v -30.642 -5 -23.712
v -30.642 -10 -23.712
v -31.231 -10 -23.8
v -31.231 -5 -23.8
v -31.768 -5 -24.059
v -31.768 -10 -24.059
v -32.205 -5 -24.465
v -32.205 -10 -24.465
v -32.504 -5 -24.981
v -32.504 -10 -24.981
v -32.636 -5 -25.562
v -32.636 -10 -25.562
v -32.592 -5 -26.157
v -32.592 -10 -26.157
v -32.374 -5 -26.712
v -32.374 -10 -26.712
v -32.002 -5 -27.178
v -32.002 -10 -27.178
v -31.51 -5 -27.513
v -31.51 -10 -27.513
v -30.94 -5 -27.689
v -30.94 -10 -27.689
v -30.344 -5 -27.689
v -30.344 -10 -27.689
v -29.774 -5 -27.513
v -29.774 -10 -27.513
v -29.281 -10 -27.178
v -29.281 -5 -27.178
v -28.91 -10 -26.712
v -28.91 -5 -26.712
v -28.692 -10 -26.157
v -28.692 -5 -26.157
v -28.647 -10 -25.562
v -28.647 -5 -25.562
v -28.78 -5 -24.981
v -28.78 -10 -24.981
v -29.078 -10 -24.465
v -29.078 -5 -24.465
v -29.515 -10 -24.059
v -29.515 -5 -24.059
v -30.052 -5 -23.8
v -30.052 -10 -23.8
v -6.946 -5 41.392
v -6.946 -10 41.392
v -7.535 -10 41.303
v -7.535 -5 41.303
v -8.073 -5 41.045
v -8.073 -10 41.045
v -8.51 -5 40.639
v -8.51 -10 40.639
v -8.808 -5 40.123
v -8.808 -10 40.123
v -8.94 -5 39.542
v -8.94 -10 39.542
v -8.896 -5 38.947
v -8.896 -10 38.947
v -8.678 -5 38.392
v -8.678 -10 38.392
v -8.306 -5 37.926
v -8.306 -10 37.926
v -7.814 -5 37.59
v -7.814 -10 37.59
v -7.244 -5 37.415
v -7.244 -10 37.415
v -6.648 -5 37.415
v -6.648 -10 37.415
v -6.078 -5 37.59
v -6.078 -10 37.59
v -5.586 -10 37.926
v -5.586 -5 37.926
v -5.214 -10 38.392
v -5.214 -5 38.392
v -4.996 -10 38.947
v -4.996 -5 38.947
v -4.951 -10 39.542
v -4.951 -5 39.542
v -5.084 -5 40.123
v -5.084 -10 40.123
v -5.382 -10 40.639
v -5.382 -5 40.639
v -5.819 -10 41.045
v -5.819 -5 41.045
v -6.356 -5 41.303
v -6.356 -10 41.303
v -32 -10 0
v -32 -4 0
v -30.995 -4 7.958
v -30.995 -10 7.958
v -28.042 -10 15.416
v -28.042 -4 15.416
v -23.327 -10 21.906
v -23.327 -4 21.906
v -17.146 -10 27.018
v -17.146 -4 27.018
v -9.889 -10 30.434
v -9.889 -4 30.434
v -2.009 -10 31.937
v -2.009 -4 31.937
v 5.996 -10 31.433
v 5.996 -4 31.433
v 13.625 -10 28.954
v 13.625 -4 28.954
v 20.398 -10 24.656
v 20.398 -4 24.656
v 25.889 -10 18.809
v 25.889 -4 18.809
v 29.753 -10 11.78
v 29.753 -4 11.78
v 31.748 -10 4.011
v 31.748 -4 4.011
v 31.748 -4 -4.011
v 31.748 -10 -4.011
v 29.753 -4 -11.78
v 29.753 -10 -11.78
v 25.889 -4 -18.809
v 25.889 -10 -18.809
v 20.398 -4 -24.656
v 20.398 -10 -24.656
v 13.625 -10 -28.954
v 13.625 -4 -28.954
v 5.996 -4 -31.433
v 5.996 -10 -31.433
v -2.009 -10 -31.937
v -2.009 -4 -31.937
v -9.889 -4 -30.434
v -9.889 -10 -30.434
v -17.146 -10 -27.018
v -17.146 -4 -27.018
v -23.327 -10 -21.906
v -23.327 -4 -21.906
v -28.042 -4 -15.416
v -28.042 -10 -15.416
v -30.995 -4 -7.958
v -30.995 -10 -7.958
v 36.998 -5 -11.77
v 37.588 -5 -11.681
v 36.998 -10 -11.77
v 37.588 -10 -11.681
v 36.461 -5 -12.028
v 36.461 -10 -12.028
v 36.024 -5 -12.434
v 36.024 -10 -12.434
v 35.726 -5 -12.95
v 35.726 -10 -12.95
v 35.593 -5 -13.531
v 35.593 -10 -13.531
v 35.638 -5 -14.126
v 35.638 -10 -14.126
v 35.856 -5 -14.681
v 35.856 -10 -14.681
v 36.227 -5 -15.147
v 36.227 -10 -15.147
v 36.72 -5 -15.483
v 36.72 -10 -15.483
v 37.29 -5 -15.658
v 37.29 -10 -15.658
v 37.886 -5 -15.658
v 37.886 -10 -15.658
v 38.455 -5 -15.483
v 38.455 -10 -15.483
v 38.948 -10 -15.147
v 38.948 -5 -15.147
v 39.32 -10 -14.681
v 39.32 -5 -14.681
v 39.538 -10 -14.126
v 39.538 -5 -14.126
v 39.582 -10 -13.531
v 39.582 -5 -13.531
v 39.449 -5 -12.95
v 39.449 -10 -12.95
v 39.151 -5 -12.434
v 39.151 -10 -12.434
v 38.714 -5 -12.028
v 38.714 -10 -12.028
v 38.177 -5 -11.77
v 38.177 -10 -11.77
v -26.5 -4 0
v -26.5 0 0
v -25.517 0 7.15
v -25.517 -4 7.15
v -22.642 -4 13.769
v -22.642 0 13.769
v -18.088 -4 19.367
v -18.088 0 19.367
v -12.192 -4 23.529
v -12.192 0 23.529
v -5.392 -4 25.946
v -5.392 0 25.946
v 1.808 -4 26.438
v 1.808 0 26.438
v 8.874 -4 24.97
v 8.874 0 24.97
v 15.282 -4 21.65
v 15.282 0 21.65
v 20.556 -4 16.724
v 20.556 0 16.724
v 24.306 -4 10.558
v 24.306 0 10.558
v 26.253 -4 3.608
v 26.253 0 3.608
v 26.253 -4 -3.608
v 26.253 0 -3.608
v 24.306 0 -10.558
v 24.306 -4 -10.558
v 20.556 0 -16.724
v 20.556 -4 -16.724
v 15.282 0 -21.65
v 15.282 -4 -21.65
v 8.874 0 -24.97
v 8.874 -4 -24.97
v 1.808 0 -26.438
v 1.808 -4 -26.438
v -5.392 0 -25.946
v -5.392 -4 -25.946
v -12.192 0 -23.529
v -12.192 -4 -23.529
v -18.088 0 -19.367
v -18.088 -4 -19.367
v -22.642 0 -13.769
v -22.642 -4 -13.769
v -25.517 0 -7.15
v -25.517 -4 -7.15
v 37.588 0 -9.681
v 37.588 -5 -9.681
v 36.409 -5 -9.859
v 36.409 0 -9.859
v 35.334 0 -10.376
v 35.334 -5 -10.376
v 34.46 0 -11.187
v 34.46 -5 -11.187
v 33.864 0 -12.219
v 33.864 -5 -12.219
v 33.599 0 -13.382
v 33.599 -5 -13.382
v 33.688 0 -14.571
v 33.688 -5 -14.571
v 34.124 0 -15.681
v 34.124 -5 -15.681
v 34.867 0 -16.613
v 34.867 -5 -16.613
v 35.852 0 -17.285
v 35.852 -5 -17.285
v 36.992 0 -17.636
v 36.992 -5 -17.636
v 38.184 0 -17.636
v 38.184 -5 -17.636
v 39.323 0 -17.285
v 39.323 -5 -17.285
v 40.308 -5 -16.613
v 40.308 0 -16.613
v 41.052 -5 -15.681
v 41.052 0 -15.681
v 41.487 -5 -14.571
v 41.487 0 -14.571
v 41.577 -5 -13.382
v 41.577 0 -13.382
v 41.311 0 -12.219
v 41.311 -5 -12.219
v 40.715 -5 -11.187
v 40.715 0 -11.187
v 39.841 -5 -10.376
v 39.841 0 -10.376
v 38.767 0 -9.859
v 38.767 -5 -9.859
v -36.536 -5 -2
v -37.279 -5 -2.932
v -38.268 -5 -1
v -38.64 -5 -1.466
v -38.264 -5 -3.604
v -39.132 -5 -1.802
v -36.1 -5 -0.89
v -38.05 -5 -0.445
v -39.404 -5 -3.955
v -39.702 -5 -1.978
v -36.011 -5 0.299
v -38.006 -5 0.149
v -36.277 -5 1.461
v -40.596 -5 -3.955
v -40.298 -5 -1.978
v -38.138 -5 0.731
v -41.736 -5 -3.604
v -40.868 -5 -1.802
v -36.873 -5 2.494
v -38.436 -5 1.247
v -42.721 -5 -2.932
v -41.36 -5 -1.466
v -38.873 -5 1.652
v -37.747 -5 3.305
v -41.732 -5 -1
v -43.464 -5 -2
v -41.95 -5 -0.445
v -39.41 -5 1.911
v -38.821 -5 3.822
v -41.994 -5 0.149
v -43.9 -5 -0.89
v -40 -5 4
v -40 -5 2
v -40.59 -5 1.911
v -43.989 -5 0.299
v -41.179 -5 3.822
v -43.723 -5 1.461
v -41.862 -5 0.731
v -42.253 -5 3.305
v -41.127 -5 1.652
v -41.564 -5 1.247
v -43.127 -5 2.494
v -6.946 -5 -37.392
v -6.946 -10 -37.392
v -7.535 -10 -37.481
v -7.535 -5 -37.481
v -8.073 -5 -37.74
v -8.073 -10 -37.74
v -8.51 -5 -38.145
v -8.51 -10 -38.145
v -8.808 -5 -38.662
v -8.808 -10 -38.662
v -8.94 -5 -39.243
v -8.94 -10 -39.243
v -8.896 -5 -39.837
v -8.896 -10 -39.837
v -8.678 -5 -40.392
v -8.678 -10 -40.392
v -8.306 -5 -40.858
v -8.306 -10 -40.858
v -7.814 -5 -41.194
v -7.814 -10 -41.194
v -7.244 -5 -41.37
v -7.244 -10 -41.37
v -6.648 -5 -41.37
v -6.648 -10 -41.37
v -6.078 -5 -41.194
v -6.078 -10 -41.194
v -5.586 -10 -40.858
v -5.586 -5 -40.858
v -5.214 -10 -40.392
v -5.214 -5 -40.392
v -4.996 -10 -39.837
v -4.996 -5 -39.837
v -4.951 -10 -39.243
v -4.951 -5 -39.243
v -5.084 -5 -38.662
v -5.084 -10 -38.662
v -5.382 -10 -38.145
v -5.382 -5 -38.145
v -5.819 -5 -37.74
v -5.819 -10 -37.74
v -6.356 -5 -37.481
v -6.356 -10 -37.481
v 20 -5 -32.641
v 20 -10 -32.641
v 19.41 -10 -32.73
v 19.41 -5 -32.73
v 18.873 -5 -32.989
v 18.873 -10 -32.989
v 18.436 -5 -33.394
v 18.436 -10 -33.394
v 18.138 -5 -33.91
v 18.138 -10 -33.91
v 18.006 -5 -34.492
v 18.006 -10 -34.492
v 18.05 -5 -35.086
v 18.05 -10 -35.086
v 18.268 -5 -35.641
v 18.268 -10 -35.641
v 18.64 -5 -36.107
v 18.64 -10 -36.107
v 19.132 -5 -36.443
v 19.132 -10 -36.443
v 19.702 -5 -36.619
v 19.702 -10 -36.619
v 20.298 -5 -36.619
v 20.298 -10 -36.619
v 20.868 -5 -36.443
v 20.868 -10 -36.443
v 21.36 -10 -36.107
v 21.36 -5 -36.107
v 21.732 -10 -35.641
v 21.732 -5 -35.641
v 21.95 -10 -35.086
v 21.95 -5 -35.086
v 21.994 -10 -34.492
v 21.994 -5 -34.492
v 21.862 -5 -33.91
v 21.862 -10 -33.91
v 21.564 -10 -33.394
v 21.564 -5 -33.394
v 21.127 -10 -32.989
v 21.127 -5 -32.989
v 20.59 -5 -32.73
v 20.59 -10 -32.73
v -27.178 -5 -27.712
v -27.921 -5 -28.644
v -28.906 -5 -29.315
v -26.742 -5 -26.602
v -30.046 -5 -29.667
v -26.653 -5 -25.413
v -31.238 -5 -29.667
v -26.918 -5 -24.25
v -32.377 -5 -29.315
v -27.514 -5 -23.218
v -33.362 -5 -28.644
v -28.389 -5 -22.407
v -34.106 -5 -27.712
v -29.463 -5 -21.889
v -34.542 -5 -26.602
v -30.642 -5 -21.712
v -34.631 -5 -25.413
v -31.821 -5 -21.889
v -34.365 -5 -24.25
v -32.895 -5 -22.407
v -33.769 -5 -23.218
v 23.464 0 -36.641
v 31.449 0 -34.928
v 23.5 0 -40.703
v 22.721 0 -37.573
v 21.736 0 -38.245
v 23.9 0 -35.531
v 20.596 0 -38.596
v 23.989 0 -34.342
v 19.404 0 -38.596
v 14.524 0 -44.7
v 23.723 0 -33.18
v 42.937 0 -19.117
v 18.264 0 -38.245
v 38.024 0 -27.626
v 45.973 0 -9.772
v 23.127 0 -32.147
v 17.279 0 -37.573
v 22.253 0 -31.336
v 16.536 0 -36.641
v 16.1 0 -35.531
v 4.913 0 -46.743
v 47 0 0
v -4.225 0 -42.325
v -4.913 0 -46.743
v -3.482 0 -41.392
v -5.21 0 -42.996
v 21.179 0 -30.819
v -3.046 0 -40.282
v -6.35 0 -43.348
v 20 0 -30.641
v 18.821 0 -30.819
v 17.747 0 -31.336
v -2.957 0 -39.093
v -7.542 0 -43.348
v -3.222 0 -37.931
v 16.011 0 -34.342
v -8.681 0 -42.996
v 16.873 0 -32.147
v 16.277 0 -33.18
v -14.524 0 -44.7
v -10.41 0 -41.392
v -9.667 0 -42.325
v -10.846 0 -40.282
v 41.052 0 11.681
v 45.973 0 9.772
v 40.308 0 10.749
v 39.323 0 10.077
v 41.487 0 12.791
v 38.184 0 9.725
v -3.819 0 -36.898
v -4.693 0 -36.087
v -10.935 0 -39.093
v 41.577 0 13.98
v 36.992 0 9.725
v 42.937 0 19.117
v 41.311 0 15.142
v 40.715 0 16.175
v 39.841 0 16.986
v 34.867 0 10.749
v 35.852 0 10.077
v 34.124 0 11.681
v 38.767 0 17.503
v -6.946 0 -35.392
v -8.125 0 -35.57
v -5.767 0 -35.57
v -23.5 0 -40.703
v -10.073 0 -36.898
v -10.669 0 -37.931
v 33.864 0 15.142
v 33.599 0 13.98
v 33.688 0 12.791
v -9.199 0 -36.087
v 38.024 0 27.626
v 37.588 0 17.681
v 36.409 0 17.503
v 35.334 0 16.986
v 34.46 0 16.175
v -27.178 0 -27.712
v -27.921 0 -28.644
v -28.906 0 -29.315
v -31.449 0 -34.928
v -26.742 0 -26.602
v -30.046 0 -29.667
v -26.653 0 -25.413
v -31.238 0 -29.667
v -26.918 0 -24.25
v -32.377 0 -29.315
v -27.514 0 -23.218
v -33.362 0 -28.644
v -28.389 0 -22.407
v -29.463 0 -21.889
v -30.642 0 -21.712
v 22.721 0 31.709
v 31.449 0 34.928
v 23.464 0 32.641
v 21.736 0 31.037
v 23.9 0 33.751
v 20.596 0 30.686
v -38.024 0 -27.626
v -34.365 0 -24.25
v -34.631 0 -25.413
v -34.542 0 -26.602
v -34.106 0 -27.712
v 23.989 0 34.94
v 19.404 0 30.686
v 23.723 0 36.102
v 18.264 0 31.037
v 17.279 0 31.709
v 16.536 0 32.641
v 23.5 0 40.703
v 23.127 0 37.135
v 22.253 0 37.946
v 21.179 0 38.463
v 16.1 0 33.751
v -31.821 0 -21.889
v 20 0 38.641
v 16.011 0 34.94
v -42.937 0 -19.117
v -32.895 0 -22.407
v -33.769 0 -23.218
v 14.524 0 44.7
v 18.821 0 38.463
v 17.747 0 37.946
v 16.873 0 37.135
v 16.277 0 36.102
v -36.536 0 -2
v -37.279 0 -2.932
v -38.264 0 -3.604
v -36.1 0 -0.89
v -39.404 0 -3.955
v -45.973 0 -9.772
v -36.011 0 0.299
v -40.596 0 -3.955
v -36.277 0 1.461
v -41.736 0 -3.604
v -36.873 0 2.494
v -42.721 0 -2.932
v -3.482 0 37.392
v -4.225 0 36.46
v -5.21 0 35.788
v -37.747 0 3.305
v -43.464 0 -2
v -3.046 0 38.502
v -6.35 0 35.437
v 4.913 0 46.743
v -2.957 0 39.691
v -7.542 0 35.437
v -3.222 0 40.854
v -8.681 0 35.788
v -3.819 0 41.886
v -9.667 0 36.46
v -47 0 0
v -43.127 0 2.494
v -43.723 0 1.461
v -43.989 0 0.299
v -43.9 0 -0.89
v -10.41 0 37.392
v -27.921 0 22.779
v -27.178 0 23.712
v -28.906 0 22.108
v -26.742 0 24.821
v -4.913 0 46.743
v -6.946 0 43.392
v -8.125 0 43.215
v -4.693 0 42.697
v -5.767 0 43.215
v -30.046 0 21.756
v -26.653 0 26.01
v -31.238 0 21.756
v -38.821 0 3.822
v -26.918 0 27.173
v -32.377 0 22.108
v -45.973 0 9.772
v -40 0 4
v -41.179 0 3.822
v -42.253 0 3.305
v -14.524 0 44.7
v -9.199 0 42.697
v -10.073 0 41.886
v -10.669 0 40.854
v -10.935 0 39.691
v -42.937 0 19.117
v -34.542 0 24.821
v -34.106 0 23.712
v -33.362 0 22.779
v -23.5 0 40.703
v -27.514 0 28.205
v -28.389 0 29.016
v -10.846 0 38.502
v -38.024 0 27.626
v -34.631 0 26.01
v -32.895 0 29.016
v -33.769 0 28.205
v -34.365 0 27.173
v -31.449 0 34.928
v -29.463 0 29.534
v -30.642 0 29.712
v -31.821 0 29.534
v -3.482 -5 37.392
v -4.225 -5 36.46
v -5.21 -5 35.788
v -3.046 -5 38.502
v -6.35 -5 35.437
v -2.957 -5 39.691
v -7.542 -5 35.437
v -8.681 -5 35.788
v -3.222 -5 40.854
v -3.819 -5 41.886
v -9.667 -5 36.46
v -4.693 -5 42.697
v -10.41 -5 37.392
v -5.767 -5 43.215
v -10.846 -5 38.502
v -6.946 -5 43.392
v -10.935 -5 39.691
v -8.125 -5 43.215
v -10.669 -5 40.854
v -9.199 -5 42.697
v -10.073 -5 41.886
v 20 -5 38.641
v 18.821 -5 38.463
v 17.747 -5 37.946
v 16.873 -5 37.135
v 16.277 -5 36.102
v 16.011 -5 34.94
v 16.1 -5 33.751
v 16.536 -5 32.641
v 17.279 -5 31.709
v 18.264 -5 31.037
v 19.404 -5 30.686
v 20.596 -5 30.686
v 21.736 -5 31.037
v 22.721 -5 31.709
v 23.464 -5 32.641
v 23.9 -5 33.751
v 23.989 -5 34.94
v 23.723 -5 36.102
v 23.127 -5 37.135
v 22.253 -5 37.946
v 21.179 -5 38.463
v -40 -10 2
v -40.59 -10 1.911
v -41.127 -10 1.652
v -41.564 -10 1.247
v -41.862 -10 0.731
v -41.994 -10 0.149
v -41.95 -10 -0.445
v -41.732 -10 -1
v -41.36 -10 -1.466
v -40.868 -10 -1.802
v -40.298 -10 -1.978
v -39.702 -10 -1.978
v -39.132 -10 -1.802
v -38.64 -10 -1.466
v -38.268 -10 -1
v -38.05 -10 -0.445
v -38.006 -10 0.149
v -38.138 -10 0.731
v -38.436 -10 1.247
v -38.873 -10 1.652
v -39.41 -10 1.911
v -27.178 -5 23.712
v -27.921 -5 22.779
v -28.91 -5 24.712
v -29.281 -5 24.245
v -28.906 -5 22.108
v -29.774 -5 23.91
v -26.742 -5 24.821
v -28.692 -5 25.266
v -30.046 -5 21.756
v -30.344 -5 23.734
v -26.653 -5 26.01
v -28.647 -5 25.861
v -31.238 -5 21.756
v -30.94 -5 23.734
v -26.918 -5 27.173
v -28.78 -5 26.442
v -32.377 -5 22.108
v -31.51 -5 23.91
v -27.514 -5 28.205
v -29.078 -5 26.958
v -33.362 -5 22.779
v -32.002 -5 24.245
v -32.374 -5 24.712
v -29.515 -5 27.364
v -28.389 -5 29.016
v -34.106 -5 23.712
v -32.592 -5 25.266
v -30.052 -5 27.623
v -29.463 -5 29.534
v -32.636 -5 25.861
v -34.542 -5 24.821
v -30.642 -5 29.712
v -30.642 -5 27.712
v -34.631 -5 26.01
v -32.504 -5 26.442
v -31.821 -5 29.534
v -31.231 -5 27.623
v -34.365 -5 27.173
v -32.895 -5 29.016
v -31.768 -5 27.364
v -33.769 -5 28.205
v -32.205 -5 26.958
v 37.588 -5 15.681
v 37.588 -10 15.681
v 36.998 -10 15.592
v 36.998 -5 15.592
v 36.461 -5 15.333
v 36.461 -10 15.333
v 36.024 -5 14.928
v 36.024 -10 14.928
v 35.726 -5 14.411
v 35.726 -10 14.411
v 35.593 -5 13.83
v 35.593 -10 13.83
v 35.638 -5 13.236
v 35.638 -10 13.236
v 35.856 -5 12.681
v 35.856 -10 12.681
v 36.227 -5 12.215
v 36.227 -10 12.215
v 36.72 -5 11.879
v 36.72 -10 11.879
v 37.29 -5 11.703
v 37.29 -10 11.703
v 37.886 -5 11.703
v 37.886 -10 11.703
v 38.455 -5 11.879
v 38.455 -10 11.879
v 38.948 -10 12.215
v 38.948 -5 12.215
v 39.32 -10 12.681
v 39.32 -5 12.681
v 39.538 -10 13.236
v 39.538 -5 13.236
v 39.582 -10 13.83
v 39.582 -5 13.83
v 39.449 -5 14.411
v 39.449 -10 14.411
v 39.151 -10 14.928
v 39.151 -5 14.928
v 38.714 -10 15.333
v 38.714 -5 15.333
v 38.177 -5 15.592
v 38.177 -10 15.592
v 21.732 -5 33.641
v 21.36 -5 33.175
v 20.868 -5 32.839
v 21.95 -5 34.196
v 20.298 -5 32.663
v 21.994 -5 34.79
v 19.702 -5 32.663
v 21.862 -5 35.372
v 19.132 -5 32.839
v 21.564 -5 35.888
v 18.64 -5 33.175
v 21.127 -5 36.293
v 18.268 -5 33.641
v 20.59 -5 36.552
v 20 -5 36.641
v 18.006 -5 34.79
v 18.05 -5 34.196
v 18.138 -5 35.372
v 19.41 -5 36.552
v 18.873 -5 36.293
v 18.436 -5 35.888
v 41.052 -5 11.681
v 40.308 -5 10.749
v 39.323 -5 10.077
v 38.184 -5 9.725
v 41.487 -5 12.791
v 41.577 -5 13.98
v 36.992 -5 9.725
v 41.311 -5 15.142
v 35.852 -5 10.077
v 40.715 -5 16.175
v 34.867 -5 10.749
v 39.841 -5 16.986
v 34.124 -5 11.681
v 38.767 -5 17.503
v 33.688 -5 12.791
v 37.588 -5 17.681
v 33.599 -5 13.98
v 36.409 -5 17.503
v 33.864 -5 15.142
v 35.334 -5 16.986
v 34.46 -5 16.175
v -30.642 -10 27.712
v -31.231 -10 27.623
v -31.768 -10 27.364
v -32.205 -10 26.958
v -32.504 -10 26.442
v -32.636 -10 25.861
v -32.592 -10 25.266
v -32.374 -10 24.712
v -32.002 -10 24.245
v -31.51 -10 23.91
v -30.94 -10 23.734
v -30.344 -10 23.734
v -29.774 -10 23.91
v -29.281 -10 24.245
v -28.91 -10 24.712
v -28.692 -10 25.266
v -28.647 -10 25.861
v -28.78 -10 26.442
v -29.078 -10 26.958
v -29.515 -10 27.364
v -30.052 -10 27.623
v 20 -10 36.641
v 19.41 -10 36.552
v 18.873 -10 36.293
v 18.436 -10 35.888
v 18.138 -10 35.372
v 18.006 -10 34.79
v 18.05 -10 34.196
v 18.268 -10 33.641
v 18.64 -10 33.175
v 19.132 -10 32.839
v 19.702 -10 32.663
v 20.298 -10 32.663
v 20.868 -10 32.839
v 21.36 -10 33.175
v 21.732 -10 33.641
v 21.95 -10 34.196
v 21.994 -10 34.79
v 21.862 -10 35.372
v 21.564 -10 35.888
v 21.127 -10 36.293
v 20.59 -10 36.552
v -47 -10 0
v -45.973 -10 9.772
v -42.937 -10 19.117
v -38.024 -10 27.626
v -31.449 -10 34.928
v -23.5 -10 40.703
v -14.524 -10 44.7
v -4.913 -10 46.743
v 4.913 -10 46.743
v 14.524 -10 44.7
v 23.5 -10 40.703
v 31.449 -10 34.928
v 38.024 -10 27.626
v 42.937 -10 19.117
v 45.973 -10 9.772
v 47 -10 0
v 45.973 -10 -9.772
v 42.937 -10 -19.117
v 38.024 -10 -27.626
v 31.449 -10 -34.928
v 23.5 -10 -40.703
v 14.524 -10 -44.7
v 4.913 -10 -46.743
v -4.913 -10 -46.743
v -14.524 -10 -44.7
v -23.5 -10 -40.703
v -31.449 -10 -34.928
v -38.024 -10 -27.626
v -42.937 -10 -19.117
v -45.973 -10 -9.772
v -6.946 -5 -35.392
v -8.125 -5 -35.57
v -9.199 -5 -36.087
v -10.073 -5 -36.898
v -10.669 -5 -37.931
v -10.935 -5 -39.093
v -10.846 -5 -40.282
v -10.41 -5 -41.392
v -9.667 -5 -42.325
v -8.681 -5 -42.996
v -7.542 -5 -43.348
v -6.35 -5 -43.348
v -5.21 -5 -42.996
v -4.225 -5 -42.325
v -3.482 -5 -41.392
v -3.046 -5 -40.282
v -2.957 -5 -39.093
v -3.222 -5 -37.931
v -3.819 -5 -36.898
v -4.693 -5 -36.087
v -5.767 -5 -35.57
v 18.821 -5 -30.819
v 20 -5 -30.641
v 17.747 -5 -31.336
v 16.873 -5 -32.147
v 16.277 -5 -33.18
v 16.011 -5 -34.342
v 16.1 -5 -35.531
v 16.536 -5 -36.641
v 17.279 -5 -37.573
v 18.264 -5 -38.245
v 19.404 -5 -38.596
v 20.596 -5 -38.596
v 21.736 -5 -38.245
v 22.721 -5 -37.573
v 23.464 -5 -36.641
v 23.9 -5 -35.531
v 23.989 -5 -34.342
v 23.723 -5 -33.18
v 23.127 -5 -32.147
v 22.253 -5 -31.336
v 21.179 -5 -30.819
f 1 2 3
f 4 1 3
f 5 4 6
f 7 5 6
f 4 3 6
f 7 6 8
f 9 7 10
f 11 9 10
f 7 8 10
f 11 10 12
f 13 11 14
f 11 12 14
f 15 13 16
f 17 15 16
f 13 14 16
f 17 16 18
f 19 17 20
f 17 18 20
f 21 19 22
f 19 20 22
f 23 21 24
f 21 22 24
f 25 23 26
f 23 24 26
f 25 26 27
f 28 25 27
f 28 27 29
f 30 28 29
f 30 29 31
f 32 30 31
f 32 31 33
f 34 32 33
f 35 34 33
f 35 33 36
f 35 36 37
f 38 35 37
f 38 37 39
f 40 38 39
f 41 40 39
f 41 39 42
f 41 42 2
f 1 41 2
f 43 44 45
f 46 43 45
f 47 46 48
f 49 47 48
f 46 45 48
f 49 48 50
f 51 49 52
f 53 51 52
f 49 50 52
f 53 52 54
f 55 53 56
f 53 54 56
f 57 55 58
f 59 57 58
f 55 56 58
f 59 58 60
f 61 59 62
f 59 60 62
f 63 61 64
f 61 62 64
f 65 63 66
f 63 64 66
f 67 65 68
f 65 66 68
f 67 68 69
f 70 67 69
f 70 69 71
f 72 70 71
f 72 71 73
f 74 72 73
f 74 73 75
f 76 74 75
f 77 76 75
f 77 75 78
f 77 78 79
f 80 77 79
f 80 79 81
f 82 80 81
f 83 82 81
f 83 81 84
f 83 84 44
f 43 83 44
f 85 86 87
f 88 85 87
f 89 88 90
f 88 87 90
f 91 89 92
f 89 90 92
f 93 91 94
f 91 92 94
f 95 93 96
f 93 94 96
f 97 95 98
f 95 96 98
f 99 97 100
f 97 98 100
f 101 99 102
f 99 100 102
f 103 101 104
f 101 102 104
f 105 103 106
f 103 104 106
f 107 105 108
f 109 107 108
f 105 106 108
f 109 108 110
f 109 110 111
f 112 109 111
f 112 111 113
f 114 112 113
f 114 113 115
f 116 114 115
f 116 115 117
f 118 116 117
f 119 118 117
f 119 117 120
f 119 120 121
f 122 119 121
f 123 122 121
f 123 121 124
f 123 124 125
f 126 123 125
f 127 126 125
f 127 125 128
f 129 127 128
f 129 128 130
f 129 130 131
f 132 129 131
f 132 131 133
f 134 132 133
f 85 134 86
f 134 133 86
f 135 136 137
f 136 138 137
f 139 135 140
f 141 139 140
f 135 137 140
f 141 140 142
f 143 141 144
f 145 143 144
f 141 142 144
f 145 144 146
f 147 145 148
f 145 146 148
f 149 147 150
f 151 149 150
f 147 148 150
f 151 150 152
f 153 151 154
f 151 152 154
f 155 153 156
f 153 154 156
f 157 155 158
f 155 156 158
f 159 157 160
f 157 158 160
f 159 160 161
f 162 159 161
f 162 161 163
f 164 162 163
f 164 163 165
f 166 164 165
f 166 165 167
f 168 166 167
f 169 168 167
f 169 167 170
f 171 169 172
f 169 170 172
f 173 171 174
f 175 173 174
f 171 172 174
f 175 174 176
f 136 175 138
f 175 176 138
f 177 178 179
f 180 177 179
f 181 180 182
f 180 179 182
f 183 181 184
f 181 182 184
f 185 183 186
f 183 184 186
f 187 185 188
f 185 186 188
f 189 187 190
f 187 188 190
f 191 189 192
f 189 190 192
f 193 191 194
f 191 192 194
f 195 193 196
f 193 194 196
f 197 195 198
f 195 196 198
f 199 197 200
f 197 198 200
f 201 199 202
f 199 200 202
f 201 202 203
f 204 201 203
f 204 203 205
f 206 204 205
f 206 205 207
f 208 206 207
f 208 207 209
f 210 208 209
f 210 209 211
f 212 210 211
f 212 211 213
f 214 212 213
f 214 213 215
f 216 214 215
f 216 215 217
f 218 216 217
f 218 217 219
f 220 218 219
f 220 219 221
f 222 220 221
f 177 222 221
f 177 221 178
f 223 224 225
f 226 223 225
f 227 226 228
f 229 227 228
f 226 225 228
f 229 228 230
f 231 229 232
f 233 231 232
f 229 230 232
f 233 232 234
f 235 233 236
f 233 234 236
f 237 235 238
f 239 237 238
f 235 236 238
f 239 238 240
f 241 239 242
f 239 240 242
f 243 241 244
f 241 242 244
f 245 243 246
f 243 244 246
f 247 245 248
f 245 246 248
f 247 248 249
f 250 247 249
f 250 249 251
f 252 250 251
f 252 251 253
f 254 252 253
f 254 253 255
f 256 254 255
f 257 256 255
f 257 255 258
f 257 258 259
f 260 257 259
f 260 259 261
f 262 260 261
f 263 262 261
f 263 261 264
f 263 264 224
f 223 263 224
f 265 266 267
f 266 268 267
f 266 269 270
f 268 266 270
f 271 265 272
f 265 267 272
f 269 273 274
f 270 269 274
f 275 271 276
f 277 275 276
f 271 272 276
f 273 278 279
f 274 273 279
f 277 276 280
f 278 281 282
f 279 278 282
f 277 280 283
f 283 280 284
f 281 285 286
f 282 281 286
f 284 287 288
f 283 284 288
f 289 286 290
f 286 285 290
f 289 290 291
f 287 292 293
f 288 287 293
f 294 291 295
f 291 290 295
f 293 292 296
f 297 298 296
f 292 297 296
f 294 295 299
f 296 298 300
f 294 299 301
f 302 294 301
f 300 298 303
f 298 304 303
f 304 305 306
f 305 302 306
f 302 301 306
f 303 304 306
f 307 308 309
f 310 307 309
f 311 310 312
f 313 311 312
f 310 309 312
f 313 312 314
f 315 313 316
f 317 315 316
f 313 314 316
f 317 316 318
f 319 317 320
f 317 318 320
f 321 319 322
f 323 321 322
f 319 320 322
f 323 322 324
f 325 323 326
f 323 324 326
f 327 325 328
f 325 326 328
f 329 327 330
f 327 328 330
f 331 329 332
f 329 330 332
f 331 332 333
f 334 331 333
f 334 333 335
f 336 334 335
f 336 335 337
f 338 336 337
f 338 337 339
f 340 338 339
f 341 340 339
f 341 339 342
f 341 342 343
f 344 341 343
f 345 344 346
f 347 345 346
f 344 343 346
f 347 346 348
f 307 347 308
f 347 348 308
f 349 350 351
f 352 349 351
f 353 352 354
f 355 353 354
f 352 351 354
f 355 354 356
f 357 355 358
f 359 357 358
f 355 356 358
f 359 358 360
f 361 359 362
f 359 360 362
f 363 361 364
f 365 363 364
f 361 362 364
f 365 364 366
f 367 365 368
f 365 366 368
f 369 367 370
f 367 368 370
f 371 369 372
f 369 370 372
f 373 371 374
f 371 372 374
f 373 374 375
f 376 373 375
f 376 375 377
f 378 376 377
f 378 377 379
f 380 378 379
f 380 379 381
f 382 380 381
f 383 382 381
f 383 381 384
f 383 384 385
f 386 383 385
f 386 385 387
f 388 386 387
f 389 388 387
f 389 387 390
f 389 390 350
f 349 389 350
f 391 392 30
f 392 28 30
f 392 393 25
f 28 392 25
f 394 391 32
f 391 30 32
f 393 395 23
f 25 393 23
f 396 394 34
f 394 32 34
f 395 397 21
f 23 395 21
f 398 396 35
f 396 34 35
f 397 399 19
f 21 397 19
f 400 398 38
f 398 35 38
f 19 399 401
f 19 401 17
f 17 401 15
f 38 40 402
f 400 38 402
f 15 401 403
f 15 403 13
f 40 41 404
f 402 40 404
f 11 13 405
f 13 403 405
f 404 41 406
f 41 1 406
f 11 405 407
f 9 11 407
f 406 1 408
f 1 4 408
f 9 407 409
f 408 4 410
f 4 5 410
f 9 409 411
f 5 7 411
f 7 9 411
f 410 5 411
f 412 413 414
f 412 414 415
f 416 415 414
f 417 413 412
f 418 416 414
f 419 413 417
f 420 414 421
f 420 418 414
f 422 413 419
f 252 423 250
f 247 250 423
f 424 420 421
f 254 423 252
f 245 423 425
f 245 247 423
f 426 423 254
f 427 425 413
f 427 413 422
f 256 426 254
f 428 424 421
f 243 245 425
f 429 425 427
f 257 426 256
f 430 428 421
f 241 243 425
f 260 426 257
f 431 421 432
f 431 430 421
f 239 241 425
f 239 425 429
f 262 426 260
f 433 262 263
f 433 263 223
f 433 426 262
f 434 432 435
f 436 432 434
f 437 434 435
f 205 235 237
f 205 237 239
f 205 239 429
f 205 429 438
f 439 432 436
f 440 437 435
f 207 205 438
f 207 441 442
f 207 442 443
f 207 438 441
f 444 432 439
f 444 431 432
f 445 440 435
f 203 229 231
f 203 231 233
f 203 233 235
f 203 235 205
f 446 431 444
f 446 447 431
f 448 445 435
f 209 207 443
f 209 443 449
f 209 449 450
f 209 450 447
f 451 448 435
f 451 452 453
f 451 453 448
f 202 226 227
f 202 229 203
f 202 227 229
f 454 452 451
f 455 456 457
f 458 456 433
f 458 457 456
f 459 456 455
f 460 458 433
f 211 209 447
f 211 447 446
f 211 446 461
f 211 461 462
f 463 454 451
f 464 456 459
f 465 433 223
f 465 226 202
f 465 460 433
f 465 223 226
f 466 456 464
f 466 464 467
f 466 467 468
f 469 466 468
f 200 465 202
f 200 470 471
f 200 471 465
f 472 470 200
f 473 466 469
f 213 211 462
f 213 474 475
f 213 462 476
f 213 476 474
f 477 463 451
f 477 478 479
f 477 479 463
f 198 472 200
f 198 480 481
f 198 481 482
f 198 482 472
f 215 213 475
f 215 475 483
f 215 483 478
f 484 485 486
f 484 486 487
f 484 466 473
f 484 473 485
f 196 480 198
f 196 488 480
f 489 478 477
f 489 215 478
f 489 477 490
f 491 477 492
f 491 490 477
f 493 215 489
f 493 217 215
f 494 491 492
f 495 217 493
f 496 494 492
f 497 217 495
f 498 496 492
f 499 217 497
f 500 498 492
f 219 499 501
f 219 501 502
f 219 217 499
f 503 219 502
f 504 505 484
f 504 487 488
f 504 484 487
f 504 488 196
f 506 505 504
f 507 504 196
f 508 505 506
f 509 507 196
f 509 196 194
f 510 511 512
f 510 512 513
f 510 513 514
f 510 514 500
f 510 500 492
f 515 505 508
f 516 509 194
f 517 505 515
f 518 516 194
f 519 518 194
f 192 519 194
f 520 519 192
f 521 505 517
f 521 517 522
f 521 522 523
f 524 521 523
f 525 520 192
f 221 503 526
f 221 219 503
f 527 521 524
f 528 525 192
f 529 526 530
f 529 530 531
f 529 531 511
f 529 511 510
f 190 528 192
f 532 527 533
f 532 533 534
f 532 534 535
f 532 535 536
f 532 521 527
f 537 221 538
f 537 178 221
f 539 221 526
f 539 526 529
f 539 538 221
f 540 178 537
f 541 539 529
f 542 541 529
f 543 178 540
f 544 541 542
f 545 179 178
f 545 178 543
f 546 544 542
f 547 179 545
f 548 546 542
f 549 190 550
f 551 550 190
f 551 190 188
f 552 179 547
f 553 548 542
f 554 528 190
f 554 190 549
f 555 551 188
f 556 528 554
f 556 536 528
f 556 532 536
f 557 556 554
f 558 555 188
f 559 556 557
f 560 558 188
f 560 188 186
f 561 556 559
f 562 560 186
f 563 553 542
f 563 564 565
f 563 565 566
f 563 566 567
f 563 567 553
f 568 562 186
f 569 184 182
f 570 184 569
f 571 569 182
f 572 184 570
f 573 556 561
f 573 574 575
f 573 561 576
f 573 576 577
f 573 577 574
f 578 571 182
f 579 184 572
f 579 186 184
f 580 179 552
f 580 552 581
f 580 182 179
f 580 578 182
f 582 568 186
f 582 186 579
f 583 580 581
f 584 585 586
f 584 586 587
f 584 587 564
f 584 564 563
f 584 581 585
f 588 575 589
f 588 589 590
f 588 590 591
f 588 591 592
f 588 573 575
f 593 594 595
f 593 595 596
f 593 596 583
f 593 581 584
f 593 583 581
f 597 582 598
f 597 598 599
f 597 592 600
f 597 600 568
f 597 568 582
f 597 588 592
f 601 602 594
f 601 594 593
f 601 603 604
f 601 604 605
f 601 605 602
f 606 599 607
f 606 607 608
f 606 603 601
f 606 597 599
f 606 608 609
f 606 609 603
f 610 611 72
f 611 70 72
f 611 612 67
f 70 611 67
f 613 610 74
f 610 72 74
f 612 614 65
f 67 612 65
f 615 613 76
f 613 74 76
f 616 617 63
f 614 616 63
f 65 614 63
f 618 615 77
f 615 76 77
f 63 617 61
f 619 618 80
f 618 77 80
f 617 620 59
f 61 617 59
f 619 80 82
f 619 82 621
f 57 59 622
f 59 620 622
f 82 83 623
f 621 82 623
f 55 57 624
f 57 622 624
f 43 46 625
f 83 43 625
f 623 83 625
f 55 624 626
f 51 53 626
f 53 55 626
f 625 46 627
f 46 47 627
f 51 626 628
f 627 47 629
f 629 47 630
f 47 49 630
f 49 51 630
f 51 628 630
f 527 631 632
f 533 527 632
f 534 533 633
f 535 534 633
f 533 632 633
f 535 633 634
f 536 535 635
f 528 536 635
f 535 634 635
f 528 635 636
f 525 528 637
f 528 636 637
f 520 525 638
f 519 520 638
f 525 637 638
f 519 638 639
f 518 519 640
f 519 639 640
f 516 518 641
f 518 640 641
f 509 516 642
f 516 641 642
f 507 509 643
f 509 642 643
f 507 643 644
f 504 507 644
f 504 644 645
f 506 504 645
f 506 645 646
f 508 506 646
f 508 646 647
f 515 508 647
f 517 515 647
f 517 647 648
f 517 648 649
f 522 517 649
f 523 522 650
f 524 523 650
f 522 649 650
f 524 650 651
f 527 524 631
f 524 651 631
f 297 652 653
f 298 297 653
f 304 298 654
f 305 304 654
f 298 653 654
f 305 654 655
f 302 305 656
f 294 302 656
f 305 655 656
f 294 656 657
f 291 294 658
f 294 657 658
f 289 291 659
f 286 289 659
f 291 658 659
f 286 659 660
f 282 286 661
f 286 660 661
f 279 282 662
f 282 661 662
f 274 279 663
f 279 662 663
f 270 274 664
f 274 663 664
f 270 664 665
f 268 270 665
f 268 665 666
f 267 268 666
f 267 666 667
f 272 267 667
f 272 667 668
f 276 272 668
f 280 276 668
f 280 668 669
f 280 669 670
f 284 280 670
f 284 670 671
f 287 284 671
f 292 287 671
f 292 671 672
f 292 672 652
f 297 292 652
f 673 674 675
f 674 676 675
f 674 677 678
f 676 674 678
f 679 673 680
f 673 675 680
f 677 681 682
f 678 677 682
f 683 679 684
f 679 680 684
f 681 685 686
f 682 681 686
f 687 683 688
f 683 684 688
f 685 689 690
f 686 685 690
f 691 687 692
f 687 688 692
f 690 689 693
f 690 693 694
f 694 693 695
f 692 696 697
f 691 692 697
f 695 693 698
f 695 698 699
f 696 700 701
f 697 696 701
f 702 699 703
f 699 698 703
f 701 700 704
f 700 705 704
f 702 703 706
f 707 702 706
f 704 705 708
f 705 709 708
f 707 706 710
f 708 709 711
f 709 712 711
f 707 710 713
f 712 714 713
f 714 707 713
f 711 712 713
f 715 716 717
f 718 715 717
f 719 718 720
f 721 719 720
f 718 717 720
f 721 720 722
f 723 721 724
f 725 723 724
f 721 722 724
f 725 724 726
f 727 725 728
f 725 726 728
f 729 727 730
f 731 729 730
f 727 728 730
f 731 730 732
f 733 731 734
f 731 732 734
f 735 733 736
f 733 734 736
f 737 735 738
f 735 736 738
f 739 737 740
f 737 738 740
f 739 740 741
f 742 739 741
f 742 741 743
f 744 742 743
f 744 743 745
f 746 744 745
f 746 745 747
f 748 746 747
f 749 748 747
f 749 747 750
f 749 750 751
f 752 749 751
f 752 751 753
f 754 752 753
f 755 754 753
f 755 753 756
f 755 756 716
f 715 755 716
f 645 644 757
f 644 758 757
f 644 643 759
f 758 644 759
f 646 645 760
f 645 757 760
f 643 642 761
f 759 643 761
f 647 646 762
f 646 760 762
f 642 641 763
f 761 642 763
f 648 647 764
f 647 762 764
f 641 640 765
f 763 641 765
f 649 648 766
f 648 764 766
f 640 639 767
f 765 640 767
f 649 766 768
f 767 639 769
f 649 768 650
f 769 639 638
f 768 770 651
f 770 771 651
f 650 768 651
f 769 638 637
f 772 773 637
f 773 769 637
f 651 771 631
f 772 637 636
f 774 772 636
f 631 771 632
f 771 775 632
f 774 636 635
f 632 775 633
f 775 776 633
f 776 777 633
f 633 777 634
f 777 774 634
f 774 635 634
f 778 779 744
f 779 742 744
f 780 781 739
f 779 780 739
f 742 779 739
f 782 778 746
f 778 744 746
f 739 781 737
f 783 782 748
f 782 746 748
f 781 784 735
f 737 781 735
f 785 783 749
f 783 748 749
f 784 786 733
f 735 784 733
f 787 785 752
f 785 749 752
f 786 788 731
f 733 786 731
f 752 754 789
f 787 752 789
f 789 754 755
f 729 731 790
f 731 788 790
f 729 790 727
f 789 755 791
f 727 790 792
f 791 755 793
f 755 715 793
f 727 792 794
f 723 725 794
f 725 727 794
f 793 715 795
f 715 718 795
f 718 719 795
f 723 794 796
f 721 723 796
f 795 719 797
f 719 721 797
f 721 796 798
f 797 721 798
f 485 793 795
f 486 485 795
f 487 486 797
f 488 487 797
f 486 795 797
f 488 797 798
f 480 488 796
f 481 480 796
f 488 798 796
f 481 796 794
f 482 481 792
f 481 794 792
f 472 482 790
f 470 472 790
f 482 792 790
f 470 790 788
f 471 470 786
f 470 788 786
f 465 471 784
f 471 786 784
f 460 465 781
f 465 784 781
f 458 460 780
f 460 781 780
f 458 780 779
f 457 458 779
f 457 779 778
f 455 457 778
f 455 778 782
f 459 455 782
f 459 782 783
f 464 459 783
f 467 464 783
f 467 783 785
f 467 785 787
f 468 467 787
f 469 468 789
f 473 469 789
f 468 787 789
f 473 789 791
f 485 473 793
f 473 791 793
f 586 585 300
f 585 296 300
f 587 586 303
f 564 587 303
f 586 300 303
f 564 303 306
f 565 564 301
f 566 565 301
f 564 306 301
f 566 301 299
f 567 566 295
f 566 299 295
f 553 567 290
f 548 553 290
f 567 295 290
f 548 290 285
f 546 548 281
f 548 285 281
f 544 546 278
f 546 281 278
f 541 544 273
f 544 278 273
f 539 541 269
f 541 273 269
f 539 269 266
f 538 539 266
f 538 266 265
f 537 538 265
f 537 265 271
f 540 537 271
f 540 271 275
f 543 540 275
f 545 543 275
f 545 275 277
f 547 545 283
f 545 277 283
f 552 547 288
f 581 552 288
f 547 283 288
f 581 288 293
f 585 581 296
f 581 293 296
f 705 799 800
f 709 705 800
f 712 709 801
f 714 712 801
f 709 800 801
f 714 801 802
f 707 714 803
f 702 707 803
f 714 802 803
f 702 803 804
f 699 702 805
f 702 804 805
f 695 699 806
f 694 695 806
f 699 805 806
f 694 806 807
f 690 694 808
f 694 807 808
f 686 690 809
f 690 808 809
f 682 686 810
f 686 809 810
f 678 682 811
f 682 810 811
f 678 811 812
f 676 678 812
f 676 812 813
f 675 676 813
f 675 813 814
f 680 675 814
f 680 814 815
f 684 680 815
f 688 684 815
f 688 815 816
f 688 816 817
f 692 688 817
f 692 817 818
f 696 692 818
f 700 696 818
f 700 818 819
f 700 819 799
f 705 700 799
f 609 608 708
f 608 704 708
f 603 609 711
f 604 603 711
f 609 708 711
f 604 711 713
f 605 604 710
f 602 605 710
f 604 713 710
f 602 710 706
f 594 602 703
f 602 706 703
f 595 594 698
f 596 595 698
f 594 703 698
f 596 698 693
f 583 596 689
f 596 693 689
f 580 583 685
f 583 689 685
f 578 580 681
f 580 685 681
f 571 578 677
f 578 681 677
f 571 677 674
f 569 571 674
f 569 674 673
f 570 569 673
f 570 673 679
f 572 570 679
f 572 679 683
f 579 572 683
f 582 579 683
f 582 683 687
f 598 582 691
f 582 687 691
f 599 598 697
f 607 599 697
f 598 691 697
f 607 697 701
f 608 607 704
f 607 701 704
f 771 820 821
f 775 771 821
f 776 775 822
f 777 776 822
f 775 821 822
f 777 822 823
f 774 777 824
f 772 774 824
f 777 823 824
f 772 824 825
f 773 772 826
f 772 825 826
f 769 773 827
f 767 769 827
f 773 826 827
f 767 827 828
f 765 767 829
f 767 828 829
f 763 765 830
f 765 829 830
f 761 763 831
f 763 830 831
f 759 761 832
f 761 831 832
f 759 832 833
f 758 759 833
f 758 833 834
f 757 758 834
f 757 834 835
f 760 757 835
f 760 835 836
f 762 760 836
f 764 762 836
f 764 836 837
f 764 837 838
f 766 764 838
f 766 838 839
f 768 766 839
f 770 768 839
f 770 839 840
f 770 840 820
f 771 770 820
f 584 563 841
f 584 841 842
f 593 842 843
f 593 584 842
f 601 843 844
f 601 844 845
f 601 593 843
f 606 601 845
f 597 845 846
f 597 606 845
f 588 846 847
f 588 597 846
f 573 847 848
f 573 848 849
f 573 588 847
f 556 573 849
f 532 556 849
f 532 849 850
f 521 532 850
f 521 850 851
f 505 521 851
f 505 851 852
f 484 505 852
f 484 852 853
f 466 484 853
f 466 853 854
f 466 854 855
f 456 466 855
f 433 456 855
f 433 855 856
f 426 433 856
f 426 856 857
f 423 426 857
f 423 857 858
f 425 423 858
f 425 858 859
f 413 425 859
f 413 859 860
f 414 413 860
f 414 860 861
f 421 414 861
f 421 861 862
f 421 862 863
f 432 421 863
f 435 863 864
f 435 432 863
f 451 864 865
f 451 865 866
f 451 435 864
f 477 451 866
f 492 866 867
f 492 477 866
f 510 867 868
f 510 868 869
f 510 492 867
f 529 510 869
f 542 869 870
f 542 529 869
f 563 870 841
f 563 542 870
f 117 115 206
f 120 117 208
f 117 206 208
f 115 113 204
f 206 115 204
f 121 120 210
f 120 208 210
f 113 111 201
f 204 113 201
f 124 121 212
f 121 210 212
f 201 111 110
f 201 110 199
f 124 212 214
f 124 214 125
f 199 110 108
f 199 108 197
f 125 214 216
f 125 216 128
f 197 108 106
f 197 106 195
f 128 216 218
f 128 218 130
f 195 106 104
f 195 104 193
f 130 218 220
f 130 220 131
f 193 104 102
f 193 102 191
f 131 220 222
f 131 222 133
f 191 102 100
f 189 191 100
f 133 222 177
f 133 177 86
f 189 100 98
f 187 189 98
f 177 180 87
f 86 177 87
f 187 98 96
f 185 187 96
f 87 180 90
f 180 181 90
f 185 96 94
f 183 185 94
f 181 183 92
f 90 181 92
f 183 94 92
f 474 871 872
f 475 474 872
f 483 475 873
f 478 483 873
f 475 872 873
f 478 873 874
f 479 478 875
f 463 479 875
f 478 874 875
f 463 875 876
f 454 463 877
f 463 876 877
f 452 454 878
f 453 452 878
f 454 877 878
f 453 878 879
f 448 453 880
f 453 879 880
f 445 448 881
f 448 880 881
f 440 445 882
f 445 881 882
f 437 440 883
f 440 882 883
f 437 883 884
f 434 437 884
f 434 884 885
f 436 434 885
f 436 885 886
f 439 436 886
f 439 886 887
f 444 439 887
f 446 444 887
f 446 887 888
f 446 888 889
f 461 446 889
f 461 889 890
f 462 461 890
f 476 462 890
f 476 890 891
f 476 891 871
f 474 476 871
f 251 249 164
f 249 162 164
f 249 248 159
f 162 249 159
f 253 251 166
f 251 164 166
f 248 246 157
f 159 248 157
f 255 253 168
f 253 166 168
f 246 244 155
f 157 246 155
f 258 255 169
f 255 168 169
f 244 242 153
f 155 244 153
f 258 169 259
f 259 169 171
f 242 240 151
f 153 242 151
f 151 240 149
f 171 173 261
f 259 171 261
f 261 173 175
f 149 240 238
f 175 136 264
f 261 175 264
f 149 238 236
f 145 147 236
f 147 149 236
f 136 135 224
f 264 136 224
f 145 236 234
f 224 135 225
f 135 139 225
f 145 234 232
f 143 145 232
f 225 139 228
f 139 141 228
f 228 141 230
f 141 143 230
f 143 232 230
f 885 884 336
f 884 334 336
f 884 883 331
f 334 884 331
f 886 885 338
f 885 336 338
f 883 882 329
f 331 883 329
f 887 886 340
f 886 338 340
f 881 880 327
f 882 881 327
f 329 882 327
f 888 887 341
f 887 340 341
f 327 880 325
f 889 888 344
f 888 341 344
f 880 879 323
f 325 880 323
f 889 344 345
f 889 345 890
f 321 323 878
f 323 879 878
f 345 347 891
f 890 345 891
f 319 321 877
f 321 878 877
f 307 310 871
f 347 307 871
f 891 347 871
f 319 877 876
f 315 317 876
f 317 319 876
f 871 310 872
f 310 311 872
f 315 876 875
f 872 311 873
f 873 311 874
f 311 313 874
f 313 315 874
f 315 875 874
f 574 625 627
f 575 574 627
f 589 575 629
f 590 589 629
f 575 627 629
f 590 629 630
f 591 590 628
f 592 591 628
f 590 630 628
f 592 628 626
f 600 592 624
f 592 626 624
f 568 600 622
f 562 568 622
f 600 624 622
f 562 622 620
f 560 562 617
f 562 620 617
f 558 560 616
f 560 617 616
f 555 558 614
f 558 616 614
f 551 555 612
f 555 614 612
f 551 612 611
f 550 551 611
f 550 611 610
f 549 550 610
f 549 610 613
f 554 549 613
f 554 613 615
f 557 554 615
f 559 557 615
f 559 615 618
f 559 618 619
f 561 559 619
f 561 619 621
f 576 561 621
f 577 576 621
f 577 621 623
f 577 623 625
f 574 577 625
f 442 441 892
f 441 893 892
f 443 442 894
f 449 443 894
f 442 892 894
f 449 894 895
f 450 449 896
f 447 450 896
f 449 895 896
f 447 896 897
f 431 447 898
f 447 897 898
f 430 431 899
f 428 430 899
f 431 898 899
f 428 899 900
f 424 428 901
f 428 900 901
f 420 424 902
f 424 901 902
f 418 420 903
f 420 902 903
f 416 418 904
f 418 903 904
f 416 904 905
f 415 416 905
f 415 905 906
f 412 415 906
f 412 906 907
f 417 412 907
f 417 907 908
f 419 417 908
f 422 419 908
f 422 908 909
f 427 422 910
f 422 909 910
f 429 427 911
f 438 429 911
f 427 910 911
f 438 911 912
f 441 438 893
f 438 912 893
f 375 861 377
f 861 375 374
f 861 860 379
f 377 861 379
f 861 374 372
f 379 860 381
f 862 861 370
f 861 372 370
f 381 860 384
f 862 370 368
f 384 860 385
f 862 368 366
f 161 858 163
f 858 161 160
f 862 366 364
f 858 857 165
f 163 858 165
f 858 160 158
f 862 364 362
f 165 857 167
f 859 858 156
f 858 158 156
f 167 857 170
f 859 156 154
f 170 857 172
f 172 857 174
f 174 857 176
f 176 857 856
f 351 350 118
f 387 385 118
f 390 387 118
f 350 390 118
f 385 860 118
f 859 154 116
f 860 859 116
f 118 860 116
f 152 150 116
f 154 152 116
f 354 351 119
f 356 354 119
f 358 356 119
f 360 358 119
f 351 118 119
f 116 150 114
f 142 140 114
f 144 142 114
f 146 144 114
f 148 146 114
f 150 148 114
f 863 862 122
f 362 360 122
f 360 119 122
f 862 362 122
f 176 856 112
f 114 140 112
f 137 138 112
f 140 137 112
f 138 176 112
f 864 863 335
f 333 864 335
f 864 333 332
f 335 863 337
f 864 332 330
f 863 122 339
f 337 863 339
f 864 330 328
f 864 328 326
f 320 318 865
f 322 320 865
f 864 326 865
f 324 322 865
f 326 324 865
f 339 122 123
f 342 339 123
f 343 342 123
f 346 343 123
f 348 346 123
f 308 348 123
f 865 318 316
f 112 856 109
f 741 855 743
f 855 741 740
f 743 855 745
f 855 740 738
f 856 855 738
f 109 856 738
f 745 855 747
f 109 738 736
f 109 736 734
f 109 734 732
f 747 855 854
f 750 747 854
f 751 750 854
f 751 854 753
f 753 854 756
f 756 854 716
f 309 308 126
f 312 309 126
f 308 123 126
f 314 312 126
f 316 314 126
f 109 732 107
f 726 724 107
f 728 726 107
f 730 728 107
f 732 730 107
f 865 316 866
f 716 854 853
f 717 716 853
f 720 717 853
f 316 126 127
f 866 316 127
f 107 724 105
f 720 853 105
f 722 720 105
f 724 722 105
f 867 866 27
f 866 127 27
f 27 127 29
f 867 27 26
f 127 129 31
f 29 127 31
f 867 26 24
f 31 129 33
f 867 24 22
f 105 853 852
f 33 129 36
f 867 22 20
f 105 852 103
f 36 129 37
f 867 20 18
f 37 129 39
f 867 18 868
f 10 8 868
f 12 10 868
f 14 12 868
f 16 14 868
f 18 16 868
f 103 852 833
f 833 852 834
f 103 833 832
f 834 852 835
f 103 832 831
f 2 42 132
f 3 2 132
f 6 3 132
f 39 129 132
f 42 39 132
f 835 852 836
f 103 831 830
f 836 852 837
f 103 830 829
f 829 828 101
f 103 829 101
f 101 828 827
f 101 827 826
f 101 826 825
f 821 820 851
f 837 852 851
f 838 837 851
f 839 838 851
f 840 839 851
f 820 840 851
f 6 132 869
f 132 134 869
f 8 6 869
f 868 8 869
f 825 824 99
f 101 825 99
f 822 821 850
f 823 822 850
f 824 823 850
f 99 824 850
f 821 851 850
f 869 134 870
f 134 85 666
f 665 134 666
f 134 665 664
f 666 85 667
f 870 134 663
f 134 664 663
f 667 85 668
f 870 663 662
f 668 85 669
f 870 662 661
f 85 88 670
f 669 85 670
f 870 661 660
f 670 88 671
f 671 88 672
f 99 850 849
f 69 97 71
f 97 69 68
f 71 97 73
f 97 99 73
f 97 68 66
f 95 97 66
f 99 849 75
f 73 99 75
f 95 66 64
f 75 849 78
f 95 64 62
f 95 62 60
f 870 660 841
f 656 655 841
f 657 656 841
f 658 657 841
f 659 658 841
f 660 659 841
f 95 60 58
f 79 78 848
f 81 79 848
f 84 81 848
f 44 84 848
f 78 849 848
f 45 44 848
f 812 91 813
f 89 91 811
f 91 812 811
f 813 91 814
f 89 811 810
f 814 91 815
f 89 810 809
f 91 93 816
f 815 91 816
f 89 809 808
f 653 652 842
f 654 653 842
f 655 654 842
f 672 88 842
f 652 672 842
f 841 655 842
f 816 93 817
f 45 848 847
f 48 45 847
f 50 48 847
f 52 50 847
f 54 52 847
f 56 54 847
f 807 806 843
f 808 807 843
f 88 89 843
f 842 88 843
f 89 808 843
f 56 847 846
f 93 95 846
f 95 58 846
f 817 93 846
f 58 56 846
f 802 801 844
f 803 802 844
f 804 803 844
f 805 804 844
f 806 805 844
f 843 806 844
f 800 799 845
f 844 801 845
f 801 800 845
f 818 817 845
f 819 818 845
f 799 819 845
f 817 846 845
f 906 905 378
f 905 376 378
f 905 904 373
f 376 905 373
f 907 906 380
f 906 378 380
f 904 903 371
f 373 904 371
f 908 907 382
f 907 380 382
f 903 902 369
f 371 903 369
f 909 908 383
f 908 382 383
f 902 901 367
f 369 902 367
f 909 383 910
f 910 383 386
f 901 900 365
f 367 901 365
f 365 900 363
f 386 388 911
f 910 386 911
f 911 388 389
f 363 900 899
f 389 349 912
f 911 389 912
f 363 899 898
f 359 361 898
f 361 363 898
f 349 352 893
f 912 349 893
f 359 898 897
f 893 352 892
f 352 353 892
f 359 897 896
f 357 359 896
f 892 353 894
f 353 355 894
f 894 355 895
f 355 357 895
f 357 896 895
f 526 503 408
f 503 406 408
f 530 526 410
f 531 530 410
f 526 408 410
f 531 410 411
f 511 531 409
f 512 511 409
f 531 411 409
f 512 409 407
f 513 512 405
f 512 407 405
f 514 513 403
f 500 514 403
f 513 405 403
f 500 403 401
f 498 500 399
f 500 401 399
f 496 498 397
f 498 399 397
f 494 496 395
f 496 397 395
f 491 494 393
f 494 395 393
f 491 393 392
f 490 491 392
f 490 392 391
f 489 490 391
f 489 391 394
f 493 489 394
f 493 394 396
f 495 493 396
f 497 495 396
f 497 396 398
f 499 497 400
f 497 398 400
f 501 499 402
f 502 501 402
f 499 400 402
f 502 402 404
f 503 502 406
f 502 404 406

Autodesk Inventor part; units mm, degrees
ref_plane "YZ Plane" through (0, 0, 0) normal (1, 0, 0) x (0, 1, 0)
ref_plane "XZ Plane" through (0, 0, 0) normal (0, 1, 0) x (-1, 0, 0)
ref_plane "XY Plane" through (0, 0, 0) normal (0, 0, 1) x (1, 0, 0)
sketch "Sketch9" plane through (0, 0, 0) normal (0, 1, 0) x (-1, 0, 0)
  circle A0 centre (0, 0) radius 32
  circle A1 centre (0, 0) radius 47
  circle A2 centre (0, 0) radius 26.5
  dimension "d54" = 64
  dimension "d55" = 94
  dimension "d56" = 53
extrude "Extrusion8" add sketch "Sketch9" against normal blind 4 contours A0
extrude "Extrusion9" add sketch "Sketch9" against normal blind 10 contours A1
sketch "Sketch10" plane through (0, 0, 0) normal (0, 1, 0) x (1, 0, 0)
  circle A0 centre (0, 0) radius 40
  point P0 (-40, 0)
  point P1 (-30.6418, -25.7115)
  point P2 (-6.9459, -39.3923)
  point P3 (20, -34.641)
  point P4 (37.5877, -13.6808)
  point P5 (37.5877, 13.6808)
  point P6 (20, 34.641)
  point P7 (-6.9459, 39.3923)
  point P8 (-30.6418, 25.7115)
  dimension "d61" = 80
  dimension "d64" = 360
hole "Hole1" at (-40, 0, 0) at (-30.6418, 0, 25.7115) at (-6.9459, 0, 39.3923) at (20, 0, 34.641) at (37.5877, 0, 13.6808) at (37.5877, 0, -13.6808) at (20, 0, -34.641) at (-6.9459, 0, -39.3923) at (-30.6418, 0, -25.7115) direction (0, -1, 0) diameter 8 depth 5
hole "Hole2" at (-30.6418, 0, -25.7115) at (-6.9459, 0, -39.3923) at (20, 0, -34.641) at (37.5877, 0, -13.6808) at (37.5877, 0, 13.6808) at (-40, 0, 0) at (20, 0, 34.641) at (-6.9459, 0, 39.3923) at (-30.6418, 0, 25.7115) direction (0, -1, 0) diameter 4 depth 10
properties part number "GFK_Ring_oben" material "Default New Material"
